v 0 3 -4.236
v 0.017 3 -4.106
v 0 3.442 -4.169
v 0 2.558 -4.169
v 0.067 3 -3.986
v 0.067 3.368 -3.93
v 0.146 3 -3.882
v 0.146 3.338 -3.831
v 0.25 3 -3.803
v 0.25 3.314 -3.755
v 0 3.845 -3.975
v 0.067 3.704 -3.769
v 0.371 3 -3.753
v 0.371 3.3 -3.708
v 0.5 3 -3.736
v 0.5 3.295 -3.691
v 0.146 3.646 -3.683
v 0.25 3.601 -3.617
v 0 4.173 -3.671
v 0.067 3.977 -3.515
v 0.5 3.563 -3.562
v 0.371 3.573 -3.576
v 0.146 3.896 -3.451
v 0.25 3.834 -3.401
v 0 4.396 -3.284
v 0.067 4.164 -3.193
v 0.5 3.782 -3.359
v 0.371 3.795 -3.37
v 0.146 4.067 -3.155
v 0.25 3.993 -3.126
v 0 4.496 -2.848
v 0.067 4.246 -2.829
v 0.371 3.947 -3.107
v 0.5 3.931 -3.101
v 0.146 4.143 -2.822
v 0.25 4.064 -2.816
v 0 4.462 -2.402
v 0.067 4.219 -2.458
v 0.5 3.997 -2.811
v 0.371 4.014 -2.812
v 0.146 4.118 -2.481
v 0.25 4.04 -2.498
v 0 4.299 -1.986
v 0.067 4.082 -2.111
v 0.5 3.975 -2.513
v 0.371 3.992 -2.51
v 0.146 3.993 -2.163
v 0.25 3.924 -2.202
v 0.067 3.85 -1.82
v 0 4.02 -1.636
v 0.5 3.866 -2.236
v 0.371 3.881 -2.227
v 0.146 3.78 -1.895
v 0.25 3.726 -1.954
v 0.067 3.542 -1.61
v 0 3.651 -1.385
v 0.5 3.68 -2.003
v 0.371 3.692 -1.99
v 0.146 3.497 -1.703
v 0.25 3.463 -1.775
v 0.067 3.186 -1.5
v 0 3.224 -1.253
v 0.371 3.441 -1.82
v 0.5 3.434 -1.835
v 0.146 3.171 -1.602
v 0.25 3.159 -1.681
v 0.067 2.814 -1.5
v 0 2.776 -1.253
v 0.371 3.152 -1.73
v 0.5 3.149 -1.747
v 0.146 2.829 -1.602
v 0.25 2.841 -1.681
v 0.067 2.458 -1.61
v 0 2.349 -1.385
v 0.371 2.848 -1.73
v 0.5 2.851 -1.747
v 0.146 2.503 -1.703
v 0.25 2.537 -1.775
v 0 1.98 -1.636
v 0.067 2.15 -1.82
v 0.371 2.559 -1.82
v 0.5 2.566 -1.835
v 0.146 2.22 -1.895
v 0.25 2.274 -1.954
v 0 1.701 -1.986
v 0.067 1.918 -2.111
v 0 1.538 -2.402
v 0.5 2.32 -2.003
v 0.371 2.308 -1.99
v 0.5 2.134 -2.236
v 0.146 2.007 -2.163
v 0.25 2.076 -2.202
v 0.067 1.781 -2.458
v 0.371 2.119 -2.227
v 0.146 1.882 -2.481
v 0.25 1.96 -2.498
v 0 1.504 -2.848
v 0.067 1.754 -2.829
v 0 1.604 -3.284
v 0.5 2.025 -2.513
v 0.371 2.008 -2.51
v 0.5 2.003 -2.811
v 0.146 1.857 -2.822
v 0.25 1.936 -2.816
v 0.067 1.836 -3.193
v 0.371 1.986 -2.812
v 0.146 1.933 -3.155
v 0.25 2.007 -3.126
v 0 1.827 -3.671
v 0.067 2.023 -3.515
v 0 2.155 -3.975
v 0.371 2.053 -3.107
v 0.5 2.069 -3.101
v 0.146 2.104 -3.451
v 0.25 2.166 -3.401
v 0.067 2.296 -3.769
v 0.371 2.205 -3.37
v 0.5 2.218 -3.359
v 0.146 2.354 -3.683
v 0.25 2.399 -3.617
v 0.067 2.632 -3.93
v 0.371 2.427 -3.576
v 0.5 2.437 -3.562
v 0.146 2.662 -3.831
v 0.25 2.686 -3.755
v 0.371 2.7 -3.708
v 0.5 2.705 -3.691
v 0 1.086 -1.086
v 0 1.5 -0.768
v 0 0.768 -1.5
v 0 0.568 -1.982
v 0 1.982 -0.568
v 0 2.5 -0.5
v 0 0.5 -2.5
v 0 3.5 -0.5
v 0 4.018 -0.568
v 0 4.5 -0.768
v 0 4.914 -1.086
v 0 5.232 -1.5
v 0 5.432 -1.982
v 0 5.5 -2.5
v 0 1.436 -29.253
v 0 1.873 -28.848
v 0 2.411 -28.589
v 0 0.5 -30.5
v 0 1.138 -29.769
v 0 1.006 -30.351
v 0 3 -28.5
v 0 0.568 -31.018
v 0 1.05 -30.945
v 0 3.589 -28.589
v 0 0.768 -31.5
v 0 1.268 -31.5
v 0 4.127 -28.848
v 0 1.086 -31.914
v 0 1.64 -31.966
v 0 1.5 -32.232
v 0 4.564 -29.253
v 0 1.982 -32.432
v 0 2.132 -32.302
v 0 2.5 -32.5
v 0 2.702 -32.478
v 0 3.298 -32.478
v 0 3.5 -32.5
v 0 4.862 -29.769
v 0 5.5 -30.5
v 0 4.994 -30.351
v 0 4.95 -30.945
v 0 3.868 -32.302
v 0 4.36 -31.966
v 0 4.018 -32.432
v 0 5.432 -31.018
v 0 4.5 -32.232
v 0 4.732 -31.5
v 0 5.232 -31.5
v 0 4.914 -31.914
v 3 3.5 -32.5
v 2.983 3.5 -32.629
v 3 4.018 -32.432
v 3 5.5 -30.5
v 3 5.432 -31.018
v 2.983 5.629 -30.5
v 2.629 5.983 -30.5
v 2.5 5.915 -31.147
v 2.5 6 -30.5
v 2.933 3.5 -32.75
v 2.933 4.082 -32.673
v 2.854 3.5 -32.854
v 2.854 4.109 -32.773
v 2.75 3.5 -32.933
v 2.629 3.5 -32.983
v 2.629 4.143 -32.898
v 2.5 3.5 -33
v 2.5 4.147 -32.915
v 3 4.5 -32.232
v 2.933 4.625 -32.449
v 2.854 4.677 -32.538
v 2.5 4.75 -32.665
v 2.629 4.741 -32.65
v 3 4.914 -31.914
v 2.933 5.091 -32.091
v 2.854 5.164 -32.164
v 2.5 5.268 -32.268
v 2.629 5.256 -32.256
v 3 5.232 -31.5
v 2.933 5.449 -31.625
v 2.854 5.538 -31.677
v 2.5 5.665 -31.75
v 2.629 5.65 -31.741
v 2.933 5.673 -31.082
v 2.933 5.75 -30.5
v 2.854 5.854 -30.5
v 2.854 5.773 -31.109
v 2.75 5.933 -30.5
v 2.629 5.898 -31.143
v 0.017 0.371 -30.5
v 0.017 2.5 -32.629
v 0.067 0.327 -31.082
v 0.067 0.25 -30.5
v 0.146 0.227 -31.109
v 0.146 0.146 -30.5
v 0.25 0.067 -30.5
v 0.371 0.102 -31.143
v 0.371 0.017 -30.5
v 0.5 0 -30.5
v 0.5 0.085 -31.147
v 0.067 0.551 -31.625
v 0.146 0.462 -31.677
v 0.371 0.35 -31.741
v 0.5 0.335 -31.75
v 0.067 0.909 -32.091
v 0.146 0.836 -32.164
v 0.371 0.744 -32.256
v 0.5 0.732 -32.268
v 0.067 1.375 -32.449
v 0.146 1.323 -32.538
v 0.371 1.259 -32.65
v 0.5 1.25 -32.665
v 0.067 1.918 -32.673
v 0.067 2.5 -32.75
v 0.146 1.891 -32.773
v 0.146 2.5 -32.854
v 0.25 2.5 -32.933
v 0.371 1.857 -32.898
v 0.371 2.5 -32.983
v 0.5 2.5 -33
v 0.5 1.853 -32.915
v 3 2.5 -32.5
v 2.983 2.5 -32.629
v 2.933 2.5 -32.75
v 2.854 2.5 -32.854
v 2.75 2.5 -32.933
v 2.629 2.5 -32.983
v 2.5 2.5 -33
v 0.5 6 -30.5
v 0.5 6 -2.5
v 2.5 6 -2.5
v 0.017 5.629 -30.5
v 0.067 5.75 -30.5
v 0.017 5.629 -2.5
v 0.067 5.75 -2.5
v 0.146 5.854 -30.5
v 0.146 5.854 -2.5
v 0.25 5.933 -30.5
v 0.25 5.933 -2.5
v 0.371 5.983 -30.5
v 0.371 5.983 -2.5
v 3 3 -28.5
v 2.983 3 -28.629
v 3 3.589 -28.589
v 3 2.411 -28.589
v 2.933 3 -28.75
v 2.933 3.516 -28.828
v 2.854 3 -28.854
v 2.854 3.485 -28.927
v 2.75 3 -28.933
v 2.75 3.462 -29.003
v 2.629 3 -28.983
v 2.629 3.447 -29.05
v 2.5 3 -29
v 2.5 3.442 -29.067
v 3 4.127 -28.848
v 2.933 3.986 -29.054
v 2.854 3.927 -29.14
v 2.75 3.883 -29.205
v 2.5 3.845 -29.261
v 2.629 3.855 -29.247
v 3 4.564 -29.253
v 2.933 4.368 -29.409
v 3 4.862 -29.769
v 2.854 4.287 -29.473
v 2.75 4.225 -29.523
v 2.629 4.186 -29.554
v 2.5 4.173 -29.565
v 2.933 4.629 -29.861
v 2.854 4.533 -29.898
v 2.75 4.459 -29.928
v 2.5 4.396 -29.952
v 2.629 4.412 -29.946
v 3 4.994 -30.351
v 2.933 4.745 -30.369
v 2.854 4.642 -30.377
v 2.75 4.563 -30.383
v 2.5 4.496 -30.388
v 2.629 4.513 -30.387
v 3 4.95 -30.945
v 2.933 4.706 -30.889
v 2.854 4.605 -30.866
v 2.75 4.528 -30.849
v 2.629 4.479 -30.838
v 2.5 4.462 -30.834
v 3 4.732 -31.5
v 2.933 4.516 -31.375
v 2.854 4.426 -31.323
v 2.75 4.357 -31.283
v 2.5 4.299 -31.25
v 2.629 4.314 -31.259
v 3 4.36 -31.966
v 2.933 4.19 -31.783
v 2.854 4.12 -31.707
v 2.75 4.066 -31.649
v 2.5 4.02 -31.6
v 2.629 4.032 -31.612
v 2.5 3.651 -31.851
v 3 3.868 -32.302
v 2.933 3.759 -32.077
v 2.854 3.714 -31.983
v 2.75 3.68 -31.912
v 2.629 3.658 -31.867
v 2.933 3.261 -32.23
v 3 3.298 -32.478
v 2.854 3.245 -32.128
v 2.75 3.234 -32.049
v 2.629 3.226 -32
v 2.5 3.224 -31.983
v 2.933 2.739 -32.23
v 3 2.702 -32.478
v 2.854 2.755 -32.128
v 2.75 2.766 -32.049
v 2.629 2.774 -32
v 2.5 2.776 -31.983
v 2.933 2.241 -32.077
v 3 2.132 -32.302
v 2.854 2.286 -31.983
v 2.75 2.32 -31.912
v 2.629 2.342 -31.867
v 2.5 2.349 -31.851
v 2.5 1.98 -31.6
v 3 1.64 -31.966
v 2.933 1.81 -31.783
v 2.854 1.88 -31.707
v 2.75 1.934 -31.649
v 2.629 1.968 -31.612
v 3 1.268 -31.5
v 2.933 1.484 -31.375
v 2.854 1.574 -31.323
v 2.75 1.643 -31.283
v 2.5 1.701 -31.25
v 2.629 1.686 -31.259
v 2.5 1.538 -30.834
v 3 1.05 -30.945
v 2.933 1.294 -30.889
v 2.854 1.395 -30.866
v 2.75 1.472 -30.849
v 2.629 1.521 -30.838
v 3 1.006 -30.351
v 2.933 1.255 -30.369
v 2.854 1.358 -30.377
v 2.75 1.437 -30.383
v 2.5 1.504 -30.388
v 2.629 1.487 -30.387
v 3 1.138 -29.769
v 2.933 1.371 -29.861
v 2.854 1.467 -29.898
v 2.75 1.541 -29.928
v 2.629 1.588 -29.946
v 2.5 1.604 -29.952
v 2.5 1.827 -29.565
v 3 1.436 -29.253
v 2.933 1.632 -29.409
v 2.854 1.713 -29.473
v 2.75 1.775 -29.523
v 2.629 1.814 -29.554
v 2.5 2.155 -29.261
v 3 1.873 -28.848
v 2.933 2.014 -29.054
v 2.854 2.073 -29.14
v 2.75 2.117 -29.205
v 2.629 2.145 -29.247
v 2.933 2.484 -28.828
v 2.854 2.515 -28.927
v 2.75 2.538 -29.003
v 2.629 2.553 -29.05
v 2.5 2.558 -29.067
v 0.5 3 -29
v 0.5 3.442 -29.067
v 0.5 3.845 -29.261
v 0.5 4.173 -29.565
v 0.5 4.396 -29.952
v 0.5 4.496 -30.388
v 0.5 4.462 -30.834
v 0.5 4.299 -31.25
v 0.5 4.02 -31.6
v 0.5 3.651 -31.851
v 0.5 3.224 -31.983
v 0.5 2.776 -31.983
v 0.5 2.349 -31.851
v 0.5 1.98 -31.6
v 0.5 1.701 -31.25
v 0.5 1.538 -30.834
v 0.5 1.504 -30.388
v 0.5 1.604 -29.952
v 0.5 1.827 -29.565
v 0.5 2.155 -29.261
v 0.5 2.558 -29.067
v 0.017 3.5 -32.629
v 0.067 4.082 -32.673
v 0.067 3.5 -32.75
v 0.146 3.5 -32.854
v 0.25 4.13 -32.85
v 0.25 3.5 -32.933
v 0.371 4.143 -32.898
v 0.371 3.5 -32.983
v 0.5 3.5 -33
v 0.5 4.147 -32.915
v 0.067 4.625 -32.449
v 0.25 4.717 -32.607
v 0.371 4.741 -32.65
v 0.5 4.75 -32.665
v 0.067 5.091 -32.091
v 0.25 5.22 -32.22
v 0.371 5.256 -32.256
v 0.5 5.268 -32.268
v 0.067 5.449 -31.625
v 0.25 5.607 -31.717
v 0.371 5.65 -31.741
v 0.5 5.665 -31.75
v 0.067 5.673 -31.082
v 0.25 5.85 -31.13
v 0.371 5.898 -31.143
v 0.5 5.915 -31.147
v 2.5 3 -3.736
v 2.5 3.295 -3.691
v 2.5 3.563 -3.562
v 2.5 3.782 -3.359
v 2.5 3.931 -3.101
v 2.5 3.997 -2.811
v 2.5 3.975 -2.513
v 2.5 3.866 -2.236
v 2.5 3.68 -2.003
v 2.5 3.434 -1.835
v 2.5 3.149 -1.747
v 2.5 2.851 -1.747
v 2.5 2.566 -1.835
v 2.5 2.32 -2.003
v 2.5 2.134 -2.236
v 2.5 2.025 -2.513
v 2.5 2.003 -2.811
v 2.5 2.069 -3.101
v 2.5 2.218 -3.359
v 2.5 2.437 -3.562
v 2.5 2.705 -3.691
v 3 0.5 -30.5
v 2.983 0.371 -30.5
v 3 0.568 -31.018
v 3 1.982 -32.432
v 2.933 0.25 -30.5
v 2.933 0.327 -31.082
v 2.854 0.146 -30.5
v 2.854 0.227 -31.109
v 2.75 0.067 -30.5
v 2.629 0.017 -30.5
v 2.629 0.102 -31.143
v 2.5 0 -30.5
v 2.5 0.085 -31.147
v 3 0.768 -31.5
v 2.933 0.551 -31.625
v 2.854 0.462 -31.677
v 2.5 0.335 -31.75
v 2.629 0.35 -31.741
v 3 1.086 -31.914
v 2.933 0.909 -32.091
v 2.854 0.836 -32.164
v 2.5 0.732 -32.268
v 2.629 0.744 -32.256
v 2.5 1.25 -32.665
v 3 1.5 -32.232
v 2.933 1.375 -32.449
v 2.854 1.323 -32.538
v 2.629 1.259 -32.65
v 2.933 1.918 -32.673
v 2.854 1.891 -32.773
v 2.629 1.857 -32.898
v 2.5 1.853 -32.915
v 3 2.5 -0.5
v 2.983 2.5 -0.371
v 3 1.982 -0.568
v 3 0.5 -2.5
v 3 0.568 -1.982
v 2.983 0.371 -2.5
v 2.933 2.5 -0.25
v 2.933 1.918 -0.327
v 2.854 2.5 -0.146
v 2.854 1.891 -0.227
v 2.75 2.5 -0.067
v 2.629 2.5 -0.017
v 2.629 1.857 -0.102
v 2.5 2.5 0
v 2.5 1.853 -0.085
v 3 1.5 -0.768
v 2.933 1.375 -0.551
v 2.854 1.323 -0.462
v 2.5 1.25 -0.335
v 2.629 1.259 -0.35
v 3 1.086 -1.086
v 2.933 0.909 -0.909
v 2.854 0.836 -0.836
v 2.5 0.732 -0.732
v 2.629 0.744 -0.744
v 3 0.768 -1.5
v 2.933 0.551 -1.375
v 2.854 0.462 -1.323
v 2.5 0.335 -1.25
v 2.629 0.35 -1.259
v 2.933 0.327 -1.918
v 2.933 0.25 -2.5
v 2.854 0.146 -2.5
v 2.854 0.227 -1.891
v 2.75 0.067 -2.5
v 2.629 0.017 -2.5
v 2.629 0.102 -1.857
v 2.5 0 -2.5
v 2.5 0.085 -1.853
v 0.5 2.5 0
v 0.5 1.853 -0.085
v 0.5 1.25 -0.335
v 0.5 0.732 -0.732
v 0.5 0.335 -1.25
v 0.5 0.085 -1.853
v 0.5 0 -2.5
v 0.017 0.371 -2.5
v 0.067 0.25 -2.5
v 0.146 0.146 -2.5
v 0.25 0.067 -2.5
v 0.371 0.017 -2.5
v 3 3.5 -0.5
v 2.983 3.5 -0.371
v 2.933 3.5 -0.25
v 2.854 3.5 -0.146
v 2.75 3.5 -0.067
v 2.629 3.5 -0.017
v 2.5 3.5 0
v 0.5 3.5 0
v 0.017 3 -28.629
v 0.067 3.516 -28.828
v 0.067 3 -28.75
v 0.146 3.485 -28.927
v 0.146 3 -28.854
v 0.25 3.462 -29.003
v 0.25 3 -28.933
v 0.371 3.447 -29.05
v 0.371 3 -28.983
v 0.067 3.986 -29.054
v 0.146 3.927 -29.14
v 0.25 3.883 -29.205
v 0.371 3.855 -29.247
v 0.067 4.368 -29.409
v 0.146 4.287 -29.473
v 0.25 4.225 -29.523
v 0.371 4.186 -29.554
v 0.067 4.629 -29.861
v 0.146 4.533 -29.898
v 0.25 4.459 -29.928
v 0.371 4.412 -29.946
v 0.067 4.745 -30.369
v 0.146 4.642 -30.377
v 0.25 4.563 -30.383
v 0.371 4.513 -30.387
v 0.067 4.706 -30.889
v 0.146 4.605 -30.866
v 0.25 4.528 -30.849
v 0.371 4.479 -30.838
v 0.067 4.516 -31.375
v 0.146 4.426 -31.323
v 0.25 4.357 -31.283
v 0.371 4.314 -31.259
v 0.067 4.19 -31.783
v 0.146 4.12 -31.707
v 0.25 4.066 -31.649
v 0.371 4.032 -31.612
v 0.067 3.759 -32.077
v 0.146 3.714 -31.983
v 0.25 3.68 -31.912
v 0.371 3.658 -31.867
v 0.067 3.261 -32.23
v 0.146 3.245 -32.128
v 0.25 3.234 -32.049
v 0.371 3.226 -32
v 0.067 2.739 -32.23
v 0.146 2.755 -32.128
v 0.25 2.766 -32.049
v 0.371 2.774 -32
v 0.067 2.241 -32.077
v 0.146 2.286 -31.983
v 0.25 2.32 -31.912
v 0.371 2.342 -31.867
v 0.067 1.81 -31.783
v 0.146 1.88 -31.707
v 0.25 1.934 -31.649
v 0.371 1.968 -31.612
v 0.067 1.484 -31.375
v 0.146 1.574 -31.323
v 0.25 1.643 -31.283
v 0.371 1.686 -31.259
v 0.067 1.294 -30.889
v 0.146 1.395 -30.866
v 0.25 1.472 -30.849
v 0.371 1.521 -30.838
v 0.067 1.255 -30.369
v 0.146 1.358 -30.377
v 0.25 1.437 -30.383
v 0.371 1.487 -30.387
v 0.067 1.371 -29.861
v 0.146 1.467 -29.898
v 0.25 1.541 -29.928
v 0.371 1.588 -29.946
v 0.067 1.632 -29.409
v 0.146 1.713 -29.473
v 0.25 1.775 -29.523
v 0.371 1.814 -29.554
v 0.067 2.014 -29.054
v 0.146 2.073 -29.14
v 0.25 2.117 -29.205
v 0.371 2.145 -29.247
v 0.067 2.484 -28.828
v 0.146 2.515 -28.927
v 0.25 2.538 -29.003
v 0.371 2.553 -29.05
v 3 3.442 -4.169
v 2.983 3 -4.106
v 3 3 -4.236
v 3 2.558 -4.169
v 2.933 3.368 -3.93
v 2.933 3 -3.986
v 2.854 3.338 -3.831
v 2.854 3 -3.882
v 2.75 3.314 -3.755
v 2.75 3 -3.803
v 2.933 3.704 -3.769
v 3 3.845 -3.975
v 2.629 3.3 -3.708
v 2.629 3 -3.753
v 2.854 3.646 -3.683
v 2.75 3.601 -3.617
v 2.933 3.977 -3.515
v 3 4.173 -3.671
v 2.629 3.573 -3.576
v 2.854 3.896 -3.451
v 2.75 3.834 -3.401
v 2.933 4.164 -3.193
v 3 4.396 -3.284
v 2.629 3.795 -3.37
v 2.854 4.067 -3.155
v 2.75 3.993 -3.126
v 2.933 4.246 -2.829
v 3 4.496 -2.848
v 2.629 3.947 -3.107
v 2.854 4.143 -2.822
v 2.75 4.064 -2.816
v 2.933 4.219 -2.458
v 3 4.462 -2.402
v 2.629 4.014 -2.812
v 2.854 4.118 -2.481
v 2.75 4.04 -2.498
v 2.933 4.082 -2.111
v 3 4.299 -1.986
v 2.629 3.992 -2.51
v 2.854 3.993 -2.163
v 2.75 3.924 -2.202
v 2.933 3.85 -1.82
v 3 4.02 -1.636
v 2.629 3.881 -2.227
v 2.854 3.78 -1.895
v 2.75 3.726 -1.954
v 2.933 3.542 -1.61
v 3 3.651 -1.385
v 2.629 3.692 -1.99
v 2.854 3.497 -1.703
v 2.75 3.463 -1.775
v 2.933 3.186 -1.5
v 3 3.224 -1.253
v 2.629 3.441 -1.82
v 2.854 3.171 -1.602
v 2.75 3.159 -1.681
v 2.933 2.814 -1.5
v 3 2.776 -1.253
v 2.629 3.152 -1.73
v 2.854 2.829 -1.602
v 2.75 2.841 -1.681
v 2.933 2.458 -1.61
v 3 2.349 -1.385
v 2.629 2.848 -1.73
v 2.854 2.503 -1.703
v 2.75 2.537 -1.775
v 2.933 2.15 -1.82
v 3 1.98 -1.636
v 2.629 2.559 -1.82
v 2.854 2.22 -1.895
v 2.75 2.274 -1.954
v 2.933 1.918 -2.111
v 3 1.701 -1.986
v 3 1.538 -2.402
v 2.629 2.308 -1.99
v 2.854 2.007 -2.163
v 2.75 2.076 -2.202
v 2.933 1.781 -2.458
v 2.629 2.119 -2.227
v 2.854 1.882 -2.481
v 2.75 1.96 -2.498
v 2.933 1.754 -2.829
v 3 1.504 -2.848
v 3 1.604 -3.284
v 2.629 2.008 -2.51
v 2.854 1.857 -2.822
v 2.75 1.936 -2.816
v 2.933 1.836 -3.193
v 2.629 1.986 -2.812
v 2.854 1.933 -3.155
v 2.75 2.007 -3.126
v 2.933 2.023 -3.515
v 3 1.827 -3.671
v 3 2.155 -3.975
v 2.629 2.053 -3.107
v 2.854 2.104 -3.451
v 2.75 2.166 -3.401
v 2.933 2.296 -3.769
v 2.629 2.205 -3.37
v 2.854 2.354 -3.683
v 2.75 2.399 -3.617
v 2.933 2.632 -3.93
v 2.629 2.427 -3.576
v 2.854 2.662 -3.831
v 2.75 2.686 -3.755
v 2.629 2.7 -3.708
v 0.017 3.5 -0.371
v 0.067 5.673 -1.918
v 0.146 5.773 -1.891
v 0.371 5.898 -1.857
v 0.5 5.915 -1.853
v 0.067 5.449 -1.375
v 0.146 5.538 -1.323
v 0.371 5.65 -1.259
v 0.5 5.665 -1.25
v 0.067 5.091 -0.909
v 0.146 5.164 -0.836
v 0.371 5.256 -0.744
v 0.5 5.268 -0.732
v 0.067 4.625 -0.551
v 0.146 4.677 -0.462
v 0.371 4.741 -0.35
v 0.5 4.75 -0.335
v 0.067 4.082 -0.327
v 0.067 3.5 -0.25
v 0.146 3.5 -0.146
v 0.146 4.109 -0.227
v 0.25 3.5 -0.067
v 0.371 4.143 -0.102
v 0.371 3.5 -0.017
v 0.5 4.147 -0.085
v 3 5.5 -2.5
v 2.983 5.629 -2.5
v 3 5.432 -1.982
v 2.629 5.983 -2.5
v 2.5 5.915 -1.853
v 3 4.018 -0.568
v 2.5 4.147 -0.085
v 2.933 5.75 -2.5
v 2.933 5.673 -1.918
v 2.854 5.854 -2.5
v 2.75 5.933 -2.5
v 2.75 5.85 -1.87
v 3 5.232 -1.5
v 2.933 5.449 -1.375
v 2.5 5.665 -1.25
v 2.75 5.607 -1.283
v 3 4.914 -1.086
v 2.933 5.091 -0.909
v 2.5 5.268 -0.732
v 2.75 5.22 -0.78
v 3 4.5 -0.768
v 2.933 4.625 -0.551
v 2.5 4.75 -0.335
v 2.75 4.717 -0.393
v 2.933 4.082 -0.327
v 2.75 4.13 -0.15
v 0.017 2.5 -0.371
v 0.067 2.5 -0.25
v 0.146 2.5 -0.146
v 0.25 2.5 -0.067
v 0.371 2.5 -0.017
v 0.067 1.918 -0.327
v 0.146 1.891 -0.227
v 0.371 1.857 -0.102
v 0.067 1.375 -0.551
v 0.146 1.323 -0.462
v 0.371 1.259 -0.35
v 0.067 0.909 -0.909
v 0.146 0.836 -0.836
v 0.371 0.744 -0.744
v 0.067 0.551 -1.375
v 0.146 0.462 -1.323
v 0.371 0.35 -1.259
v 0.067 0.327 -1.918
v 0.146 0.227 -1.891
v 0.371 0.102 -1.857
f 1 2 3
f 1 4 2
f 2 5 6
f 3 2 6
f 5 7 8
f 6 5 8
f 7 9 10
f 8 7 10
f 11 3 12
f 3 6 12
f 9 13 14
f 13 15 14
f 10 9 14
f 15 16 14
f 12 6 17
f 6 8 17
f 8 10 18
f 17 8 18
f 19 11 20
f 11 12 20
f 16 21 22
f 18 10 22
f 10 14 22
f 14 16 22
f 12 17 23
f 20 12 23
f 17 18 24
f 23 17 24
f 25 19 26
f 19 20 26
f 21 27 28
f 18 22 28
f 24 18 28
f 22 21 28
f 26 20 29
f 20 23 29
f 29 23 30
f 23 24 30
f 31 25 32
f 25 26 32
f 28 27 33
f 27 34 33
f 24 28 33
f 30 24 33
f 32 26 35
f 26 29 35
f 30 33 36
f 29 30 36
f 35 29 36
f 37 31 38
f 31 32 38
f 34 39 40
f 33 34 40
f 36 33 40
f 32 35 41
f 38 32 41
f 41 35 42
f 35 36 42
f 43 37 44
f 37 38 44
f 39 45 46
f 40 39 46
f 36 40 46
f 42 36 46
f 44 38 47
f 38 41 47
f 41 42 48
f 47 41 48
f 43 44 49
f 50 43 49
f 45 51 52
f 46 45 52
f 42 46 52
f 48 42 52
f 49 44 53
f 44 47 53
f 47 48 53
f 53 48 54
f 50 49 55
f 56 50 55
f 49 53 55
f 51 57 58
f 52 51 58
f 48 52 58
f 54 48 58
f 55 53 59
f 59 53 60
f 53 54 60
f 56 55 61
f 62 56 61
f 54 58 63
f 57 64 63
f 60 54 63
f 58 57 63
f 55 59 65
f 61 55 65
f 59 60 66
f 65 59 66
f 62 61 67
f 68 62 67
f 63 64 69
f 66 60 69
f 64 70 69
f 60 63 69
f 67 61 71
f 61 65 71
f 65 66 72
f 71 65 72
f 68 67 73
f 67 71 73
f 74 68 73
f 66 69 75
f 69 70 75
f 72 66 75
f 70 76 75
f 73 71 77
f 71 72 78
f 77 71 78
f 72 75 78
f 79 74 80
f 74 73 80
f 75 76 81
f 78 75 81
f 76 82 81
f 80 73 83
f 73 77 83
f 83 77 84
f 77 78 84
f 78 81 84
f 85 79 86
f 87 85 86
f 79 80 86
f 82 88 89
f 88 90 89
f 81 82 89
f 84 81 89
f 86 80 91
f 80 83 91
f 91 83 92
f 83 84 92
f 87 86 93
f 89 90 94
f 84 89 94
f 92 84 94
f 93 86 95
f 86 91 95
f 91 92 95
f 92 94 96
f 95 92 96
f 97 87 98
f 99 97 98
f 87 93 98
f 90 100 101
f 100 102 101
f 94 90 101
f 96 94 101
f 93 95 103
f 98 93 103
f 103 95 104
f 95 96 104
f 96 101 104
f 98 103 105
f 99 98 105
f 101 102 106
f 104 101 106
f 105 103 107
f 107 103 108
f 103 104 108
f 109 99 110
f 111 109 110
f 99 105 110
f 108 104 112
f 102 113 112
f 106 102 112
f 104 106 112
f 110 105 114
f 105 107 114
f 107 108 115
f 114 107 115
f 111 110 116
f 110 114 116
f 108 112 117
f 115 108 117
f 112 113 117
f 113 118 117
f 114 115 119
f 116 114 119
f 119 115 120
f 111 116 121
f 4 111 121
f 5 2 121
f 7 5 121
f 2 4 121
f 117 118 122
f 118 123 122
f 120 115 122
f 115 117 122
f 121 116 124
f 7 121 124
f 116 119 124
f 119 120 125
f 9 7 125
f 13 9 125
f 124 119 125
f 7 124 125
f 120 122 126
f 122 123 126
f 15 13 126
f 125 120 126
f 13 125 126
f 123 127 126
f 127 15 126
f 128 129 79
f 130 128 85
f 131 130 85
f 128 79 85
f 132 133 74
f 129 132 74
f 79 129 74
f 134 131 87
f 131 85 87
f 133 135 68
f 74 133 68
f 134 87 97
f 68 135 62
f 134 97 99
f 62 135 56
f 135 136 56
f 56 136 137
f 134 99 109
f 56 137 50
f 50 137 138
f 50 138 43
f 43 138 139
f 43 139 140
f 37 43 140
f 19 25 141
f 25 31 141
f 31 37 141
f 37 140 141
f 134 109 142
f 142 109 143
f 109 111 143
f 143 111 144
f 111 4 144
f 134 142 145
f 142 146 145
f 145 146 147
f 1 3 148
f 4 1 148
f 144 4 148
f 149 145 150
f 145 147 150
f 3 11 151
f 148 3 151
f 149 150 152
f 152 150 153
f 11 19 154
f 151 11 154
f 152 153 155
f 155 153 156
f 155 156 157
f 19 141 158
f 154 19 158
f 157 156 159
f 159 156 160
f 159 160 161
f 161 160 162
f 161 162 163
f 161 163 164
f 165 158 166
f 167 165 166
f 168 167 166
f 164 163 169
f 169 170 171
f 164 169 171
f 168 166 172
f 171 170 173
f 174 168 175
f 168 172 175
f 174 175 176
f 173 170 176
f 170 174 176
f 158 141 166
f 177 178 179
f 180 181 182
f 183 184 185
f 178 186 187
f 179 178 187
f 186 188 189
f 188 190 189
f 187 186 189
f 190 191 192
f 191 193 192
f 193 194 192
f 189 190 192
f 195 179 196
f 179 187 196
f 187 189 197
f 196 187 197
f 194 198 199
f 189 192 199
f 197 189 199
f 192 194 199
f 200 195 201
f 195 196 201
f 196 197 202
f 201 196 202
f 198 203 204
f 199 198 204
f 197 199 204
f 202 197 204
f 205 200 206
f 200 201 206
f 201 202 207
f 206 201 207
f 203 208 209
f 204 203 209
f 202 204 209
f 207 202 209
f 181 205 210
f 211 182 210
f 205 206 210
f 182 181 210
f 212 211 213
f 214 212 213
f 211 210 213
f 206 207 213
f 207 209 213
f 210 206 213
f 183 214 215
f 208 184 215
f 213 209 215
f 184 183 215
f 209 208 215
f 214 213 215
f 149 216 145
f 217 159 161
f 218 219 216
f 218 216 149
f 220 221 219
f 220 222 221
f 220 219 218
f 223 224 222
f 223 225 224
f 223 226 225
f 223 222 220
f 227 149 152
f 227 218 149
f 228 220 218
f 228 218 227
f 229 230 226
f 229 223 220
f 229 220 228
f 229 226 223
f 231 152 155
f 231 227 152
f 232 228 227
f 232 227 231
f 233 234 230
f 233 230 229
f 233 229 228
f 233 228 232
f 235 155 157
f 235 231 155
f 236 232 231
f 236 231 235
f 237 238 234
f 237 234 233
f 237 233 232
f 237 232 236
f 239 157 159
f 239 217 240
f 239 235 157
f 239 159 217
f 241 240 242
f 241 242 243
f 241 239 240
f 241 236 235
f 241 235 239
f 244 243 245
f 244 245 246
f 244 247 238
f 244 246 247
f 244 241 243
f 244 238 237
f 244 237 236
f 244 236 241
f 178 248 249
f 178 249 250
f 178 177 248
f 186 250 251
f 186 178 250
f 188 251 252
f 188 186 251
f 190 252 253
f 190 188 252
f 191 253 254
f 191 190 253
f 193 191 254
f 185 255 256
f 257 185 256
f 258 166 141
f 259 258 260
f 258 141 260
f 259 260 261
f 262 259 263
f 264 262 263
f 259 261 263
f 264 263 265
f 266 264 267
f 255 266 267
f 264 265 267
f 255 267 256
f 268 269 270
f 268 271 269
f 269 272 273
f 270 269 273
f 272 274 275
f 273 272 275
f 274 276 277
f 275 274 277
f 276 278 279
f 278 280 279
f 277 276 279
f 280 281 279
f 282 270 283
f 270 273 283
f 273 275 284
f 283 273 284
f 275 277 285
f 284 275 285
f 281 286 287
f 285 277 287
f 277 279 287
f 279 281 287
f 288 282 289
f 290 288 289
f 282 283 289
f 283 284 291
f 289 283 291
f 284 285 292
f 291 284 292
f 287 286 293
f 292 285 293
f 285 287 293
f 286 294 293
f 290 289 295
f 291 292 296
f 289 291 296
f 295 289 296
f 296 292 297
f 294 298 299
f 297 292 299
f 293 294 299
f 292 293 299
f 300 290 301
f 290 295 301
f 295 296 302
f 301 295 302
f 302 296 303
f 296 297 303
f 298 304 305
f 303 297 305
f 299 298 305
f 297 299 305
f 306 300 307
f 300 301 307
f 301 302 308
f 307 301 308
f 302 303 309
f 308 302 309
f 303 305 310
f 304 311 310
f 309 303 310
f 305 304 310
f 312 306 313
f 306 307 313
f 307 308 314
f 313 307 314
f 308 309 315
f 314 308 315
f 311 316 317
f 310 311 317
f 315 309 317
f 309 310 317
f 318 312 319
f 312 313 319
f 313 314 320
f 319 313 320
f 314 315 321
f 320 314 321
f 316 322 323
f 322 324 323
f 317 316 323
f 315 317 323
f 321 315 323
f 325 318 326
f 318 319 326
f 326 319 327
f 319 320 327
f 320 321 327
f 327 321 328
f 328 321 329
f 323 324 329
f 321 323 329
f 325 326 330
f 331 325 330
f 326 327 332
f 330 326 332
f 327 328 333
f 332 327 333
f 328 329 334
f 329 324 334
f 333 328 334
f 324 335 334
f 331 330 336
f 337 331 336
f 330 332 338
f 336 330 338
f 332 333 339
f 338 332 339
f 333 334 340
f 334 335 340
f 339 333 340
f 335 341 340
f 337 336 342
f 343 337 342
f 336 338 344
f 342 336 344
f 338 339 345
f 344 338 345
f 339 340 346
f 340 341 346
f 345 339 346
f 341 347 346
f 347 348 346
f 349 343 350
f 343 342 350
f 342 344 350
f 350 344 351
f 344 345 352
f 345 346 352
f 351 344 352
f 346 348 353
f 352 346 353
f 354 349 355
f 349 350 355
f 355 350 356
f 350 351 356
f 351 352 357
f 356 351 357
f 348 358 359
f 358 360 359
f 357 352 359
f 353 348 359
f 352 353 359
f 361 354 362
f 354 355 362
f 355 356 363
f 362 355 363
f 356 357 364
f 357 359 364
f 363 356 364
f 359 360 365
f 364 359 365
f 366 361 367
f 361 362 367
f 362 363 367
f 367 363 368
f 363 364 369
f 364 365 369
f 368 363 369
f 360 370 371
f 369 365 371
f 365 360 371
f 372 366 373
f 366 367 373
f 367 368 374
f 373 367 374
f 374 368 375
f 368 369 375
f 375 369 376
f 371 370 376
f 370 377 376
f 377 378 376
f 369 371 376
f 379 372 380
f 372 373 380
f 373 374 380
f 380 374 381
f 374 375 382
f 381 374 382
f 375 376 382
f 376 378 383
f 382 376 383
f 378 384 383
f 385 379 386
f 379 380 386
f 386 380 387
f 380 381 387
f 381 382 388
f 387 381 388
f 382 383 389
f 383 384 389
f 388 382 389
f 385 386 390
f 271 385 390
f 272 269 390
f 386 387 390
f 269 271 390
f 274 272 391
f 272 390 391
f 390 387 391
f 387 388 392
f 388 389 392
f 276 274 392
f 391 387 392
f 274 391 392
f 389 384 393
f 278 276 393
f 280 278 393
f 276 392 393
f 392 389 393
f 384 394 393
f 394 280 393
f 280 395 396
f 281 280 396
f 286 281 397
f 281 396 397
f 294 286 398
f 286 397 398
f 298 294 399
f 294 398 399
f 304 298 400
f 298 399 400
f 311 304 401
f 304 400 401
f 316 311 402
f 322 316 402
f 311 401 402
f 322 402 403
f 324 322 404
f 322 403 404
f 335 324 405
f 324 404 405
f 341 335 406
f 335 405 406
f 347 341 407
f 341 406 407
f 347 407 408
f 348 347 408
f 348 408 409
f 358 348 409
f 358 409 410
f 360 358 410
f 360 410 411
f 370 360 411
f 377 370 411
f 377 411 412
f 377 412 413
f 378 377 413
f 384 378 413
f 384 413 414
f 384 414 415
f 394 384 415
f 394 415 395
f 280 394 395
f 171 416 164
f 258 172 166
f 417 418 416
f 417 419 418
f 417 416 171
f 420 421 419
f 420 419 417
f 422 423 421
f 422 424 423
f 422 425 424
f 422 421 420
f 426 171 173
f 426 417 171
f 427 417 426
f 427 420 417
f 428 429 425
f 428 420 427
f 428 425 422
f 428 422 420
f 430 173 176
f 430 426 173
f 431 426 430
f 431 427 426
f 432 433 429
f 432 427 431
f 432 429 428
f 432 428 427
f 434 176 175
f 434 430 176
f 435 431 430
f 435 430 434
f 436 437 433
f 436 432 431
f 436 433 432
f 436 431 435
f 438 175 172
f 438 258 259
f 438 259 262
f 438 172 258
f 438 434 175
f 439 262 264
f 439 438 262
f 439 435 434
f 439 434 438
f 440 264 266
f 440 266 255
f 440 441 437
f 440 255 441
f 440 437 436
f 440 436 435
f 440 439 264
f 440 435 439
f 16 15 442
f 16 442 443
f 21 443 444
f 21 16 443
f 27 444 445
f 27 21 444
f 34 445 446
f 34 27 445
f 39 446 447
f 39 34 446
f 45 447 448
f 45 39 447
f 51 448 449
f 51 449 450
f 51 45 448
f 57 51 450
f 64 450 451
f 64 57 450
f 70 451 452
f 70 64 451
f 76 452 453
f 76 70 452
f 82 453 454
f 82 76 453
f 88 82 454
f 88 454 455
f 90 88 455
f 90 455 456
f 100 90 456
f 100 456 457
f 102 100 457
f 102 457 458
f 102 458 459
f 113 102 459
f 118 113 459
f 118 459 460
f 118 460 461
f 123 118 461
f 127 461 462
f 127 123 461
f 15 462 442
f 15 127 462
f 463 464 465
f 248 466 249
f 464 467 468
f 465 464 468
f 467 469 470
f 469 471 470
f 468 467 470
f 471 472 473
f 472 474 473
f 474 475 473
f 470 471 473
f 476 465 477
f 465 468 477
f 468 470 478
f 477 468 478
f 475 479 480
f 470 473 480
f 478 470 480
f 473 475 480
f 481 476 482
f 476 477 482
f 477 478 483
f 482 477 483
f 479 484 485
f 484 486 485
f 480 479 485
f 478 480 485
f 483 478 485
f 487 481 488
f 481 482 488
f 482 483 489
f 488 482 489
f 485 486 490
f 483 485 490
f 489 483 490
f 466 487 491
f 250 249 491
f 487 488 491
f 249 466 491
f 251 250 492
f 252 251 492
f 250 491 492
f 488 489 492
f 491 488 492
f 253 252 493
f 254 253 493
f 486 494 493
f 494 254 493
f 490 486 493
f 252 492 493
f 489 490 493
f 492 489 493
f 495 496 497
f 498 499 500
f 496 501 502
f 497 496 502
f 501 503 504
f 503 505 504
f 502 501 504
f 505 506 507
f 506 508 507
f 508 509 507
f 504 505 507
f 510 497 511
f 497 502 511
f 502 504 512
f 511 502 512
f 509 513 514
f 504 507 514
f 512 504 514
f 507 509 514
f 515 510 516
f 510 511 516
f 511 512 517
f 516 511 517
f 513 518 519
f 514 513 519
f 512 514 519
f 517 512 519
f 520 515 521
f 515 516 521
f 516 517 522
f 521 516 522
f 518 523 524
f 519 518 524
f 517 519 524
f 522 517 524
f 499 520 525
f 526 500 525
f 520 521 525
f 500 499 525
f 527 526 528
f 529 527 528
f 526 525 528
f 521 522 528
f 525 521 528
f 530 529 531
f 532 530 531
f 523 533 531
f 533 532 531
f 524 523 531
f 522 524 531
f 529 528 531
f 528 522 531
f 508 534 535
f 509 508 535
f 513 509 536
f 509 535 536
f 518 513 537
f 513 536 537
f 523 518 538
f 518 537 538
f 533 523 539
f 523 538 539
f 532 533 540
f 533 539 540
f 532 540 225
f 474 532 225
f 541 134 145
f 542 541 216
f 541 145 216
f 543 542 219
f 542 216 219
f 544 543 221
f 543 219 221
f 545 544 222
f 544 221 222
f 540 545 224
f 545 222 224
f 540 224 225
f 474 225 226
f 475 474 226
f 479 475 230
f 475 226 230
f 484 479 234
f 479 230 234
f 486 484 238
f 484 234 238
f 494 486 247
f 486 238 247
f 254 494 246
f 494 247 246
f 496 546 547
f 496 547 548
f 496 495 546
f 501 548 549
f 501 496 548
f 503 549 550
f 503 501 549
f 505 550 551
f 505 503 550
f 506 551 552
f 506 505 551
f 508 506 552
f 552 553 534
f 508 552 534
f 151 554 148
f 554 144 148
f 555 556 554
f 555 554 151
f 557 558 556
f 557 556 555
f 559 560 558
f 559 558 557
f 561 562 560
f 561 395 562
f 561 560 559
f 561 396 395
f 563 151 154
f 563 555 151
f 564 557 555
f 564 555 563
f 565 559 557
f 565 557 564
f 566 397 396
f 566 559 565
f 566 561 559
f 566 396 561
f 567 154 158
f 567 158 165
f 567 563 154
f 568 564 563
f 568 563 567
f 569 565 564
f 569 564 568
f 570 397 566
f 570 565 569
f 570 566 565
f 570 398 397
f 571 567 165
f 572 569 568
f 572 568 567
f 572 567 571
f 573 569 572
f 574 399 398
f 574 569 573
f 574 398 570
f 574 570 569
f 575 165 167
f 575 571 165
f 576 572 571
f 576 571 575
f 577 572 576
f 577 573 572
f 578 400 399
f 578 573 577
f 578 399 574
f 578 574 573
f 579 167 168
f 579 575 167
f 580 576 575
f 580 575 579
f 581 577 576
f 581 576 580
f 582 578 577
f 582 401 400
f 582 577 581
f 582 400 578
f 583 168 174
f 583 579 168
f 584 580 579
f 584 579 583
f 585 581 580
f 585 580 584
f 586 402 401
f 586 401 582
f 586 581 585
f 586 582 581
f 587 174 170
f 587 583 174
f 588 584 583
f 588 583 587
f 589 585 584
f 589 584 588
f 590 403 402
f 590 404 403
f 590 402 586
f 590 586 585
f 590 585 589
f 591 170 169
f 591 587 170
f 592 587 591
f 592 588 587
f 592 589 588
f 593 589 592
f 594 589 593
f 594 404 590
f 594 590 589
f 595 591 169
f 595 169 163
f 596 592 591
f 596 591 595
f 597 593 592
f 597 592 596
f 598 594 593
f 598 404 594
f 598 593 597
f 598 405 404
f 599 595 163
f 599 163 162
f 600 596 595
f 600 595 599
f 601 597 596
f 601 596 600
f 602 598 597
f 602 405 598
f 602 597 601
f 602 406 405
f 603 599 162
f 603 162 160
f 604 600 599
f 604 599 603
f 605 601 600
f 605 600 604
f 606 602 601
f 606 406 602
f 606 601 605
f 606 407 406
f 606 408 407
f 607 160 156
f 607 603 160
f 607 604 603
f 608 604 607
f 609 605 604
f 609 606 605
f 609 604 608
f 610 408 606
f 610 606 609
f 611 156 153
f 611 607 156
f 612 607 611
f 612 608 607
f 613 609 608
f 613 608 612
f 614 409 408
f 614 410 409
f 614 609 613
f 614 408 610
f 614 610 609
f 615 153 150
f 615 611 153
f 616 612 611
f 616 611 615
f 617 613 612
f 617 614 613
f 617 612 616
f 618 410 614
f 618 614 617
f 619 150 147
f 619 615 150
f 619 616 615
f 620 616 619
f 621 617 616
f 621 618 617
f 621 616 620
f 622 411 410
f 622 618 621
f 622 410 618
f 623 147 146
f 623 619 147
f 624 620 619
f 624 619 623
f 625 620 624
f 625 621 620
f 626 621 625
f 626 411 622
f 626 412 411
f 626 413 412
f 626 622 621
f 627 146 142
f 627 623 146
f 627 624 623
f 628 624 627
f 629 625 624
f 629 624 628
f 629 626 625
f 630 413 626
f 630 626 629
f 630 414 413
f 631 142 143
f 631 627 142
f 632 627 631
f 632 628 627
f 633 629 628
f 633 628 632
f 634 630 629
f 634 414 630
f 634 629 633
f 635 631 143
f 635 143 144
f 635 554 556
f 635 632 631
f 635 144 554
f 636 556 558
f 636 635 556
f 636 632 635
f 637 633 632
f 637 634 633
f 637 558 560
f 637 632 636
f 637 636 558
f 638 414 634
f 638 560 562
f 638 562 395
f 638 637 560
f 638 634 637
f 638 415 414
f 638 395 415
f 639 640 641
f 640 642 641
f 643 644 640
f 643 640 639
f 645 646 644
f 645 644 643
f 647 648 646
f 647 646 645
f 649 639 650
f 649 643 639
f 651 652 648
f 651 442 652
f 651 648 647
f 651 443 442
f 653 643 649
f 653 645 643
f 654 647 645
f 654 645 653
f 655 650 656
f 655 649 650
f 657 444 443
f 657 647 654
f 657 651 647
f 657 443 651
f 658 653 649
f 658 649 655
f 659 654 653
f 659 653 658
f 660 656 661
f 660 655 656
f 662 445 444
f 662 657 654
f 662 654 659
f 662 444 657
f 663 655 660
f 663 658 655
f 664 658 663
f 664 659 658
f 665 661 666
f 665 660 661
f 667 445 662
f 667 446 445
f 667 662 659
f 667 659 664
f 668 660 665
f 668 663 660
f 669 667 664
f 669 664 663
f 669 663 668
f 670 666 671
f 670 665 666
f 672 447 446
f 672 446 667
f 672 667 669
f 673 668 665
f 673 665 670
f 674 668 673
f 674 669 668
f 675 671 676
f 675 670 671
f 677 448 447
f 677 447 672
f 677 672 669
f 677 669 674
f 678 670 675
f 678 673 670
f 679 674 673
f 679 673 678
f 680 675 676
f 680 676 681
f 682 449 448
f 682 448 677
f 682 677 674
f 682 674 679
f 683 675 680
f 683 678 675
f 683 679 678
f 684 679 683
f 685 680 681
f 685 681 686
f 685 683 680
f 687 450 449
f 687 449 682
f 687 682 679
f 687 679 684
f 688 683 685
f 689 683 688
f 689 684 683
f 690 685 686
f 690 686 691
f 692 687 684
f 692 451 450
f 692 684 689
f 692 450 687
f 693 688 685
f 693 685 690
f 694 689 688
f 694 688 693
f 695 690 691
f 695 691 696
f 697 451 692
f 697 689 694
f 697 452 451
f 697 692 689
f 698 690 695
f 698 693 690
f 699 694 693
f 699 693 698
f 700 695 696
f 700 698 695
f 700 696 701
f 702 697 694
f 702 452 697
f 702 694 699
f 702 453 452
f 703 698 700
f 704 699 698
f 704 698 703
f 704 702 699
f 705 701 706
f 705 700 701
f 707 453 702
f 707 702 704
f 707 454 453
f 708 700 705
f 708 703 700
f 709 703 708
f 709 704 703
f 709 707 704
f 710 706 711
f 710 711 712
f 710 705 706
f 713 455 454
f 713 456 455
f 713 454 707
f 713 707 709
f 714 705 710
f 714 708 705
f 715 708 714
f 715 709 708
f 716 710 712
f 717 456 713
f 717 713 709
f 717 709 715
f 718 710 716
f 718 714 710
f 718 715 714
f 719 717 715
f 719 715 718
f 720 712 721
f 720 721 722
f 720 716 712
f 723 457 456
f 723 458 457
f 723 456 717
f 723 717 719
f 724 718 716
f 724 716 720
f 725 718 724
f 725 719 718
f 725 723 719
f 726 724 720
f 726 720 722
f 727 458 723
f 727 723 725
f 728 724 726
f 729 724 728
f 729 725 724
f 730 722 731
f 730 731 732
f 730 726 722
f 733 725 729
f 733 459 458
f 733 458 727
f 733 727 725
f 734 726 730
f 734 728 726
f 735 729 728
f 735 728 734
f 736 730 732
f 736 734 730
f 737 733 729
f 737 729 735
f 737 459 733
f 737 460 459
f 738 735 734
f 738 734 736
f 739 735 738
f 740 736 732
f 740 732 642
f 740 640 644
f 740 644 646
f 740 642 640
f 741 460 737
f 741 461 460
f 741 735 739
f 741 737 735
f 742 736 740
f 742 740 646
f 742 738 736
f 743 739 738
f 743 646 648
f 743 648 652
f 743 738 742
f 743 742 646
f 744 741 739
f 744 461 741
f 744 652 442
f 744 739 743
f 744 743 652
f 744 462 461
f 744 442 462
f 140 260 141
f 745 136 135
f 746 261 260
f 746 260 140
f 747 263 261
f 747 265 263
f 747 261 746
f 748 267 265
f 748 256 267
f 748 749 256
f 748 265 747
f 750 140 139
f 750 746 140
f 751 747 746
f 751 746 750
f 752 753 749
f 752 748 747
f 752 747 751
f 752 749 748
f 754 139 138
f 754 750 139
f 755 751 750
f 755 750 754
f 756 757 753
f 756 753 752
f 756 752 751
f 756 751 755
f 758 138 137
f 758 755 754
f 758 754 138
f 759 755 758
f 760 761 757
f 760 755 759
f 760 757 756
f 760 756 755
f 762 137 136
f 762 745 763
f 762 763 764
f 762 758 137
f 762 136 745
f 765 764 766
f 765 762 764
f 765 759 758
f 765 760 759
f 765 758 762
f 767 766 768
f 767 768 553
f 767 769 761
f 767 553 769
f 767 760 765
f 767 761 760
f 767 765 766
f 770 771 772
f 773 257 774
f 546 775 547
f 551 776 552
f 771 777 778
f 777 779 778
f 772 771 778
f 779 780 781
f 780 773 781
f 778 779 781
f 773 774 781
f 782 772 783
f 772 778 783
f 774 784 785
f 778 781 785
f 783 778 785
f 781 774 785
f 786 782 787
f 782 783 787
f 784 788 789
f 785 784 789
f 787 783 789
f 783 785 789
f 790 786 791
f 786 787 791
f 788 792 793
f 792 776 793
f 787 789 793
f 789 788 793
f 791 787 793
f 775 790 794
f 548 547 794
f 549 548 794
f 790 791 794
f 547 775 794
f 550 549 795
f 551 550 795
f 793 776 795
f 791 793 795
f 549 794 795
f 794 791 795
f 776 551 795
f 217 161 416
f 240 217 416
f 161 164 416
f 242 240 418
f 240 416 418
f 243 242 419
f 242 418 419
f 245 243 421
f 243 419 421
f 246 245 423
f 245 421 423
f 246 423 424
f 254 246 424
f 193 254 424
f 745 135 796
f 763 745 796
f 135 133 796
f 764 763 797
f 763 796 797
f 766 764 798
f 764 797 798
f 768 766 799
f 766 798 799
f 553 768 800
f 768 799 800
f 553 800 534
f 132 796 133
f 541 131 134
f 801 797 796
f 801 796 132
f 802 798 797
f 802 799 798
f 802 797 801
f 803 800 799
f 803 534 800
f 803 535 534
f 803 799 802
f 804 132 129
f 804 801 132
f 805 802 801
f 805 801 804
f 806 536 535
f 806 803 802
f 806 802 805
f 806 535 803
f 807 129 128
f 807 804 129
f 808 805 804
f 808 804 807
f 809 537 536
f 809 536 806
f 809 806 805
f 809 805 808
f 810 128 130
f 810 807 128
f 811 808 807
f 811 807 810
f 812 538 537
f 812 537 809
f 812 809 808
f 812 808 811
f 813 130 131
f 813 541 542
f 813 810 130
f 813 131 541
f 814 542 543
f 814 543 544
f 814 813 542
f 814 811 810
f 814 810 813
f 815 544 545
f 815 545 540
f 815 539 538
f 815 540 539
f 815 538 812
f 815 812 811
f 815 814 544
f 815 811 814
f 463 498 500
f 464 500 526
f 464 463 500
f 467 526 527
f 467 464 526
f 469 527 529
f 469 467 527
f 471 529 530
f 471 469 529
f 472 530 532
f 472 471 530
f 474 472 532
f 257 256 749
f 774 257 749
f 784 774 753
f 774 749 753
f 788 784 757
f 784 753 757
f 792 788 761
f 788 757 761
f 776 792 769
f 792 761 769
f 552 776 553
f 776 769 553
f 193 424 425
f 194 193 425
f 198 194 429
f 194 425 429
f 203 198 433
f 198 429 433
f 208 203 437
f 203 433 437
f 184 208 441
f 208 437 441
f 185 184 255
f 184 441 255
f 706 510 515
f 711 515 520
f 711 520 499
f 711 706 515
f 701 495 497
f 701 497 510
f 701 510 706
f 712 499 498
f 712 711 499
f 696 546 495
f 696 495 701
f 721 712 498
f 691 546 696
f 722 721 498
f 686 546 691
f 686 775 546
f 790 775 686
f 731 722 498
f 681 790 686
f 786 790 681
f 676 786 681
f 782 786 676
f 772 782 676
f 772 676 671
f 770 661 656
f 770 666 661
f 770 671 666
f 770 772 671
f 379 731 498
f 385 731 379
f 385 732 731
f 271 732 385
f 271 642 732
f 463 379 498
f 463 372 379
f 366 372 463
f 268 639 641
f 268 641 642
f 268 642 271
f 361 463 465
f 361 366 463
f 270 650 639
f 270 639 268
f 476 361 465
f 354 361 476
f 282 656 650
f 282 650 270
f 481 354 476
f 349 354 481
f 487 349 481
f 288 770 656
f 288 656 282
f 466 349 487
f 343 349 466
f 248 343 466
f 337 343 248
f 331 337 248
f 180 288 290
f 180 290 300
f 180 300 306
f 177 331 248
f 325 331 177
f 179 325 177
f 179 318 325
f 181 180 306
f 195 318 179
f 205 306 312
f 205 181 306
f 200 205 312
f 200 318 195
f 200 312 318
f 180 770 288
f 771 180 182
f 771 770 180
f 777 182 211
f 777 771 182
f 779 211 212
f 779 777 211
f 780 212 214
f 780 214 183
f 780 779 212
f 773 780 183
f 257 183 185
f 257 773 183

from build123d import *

# Parameters (mm, degrees)
SKETCH1_R           = 1
BOSS_EXTRUDE1_DEPTH = 3
SKETCH2_R           = 1.5
CUT_EXTRUDE1_DEPTH  = 10
FILLET1_R           = 0.5


with BuildPart() as part:
    # Sketch1 → Boss-Extrude1 (new body)
    with BuildSketch(Plane(origin=(0, 0, 0), x_dir=(0, 0, -1), z_dir=(1, 0, 0))):
        with BuildLine():
            Line((2.5, 0), (30.5, 0))
            ThreePointArc((30.5, 0), (32.267766953, 0.732233047), (33, 2.5))
            Line((33, 2.5), (33, 3.5))
            ThreePointArc((33, 3.5), (32.267766953, 5.267766953), (30.5, 6))
            Line((30.5, 6), (2.5, 6))
            ThreePointArc((2.5, 6), (0.732233047, 5.267766953), (0, 3.5))
            Line((0, 3.5), (0, 2.5))
            ThreePointArc((0, 2.5), (0.732233047, 0.732233047), (2.5, 0))
        make_face()
        with Locations((2.73587532, 3)):
            Circle(SKETCH1_R, mode=Mode.SUBTRACT)
    extrude(amount=BOSS_EXTRUDE1_DEPTH)

    # Sketch2 → Cut-Extrude1 (cut)
    with BuildSketch(Plane.ZY):
        with Locations((-30.5, 3)):
            Circle(SKETCH2_R)
    extrude(amount=-CUT_EXTRUDE1_DEPTH, mode=Mode.SUBTRACT)

    # Fillet1
    fillet1_edges = [part.edges().sort_by_distance(p)[0] for p in [
        (3, 5.267766953, -0.732233047),
        (0, 6, -16.5),
        (0, 5.267766953, -32.267766953),
        (3, 3, 0),
        (3, 0.732233047, -0.732233047),
        (3, 0, -16.5),
        (0, 3, -1.73587532),
        (3, 3, -1.73587532),
        (3, 0.732233047, -32.267766953),
        (3, 3, -33),
        (3, 3, -32),
        (0, 3, -32),
        (3, 5.267766953, -32.267766953),
        (3, 6, -16.5),
        (0, 3, -33),
        (0, 0.732233047, -32.267766953),
        (0, 0, -16.5),
        (0, 0.732233047, -0.732233047),
        (0, 3, 0),
        (0, 5.267766953, -0.732233047),
    ]]
    fillet(fillet1_edges, radius=FILLET1_R - 0.0001)  # a hair under: the kernel refuses the full size


solid = part.part
